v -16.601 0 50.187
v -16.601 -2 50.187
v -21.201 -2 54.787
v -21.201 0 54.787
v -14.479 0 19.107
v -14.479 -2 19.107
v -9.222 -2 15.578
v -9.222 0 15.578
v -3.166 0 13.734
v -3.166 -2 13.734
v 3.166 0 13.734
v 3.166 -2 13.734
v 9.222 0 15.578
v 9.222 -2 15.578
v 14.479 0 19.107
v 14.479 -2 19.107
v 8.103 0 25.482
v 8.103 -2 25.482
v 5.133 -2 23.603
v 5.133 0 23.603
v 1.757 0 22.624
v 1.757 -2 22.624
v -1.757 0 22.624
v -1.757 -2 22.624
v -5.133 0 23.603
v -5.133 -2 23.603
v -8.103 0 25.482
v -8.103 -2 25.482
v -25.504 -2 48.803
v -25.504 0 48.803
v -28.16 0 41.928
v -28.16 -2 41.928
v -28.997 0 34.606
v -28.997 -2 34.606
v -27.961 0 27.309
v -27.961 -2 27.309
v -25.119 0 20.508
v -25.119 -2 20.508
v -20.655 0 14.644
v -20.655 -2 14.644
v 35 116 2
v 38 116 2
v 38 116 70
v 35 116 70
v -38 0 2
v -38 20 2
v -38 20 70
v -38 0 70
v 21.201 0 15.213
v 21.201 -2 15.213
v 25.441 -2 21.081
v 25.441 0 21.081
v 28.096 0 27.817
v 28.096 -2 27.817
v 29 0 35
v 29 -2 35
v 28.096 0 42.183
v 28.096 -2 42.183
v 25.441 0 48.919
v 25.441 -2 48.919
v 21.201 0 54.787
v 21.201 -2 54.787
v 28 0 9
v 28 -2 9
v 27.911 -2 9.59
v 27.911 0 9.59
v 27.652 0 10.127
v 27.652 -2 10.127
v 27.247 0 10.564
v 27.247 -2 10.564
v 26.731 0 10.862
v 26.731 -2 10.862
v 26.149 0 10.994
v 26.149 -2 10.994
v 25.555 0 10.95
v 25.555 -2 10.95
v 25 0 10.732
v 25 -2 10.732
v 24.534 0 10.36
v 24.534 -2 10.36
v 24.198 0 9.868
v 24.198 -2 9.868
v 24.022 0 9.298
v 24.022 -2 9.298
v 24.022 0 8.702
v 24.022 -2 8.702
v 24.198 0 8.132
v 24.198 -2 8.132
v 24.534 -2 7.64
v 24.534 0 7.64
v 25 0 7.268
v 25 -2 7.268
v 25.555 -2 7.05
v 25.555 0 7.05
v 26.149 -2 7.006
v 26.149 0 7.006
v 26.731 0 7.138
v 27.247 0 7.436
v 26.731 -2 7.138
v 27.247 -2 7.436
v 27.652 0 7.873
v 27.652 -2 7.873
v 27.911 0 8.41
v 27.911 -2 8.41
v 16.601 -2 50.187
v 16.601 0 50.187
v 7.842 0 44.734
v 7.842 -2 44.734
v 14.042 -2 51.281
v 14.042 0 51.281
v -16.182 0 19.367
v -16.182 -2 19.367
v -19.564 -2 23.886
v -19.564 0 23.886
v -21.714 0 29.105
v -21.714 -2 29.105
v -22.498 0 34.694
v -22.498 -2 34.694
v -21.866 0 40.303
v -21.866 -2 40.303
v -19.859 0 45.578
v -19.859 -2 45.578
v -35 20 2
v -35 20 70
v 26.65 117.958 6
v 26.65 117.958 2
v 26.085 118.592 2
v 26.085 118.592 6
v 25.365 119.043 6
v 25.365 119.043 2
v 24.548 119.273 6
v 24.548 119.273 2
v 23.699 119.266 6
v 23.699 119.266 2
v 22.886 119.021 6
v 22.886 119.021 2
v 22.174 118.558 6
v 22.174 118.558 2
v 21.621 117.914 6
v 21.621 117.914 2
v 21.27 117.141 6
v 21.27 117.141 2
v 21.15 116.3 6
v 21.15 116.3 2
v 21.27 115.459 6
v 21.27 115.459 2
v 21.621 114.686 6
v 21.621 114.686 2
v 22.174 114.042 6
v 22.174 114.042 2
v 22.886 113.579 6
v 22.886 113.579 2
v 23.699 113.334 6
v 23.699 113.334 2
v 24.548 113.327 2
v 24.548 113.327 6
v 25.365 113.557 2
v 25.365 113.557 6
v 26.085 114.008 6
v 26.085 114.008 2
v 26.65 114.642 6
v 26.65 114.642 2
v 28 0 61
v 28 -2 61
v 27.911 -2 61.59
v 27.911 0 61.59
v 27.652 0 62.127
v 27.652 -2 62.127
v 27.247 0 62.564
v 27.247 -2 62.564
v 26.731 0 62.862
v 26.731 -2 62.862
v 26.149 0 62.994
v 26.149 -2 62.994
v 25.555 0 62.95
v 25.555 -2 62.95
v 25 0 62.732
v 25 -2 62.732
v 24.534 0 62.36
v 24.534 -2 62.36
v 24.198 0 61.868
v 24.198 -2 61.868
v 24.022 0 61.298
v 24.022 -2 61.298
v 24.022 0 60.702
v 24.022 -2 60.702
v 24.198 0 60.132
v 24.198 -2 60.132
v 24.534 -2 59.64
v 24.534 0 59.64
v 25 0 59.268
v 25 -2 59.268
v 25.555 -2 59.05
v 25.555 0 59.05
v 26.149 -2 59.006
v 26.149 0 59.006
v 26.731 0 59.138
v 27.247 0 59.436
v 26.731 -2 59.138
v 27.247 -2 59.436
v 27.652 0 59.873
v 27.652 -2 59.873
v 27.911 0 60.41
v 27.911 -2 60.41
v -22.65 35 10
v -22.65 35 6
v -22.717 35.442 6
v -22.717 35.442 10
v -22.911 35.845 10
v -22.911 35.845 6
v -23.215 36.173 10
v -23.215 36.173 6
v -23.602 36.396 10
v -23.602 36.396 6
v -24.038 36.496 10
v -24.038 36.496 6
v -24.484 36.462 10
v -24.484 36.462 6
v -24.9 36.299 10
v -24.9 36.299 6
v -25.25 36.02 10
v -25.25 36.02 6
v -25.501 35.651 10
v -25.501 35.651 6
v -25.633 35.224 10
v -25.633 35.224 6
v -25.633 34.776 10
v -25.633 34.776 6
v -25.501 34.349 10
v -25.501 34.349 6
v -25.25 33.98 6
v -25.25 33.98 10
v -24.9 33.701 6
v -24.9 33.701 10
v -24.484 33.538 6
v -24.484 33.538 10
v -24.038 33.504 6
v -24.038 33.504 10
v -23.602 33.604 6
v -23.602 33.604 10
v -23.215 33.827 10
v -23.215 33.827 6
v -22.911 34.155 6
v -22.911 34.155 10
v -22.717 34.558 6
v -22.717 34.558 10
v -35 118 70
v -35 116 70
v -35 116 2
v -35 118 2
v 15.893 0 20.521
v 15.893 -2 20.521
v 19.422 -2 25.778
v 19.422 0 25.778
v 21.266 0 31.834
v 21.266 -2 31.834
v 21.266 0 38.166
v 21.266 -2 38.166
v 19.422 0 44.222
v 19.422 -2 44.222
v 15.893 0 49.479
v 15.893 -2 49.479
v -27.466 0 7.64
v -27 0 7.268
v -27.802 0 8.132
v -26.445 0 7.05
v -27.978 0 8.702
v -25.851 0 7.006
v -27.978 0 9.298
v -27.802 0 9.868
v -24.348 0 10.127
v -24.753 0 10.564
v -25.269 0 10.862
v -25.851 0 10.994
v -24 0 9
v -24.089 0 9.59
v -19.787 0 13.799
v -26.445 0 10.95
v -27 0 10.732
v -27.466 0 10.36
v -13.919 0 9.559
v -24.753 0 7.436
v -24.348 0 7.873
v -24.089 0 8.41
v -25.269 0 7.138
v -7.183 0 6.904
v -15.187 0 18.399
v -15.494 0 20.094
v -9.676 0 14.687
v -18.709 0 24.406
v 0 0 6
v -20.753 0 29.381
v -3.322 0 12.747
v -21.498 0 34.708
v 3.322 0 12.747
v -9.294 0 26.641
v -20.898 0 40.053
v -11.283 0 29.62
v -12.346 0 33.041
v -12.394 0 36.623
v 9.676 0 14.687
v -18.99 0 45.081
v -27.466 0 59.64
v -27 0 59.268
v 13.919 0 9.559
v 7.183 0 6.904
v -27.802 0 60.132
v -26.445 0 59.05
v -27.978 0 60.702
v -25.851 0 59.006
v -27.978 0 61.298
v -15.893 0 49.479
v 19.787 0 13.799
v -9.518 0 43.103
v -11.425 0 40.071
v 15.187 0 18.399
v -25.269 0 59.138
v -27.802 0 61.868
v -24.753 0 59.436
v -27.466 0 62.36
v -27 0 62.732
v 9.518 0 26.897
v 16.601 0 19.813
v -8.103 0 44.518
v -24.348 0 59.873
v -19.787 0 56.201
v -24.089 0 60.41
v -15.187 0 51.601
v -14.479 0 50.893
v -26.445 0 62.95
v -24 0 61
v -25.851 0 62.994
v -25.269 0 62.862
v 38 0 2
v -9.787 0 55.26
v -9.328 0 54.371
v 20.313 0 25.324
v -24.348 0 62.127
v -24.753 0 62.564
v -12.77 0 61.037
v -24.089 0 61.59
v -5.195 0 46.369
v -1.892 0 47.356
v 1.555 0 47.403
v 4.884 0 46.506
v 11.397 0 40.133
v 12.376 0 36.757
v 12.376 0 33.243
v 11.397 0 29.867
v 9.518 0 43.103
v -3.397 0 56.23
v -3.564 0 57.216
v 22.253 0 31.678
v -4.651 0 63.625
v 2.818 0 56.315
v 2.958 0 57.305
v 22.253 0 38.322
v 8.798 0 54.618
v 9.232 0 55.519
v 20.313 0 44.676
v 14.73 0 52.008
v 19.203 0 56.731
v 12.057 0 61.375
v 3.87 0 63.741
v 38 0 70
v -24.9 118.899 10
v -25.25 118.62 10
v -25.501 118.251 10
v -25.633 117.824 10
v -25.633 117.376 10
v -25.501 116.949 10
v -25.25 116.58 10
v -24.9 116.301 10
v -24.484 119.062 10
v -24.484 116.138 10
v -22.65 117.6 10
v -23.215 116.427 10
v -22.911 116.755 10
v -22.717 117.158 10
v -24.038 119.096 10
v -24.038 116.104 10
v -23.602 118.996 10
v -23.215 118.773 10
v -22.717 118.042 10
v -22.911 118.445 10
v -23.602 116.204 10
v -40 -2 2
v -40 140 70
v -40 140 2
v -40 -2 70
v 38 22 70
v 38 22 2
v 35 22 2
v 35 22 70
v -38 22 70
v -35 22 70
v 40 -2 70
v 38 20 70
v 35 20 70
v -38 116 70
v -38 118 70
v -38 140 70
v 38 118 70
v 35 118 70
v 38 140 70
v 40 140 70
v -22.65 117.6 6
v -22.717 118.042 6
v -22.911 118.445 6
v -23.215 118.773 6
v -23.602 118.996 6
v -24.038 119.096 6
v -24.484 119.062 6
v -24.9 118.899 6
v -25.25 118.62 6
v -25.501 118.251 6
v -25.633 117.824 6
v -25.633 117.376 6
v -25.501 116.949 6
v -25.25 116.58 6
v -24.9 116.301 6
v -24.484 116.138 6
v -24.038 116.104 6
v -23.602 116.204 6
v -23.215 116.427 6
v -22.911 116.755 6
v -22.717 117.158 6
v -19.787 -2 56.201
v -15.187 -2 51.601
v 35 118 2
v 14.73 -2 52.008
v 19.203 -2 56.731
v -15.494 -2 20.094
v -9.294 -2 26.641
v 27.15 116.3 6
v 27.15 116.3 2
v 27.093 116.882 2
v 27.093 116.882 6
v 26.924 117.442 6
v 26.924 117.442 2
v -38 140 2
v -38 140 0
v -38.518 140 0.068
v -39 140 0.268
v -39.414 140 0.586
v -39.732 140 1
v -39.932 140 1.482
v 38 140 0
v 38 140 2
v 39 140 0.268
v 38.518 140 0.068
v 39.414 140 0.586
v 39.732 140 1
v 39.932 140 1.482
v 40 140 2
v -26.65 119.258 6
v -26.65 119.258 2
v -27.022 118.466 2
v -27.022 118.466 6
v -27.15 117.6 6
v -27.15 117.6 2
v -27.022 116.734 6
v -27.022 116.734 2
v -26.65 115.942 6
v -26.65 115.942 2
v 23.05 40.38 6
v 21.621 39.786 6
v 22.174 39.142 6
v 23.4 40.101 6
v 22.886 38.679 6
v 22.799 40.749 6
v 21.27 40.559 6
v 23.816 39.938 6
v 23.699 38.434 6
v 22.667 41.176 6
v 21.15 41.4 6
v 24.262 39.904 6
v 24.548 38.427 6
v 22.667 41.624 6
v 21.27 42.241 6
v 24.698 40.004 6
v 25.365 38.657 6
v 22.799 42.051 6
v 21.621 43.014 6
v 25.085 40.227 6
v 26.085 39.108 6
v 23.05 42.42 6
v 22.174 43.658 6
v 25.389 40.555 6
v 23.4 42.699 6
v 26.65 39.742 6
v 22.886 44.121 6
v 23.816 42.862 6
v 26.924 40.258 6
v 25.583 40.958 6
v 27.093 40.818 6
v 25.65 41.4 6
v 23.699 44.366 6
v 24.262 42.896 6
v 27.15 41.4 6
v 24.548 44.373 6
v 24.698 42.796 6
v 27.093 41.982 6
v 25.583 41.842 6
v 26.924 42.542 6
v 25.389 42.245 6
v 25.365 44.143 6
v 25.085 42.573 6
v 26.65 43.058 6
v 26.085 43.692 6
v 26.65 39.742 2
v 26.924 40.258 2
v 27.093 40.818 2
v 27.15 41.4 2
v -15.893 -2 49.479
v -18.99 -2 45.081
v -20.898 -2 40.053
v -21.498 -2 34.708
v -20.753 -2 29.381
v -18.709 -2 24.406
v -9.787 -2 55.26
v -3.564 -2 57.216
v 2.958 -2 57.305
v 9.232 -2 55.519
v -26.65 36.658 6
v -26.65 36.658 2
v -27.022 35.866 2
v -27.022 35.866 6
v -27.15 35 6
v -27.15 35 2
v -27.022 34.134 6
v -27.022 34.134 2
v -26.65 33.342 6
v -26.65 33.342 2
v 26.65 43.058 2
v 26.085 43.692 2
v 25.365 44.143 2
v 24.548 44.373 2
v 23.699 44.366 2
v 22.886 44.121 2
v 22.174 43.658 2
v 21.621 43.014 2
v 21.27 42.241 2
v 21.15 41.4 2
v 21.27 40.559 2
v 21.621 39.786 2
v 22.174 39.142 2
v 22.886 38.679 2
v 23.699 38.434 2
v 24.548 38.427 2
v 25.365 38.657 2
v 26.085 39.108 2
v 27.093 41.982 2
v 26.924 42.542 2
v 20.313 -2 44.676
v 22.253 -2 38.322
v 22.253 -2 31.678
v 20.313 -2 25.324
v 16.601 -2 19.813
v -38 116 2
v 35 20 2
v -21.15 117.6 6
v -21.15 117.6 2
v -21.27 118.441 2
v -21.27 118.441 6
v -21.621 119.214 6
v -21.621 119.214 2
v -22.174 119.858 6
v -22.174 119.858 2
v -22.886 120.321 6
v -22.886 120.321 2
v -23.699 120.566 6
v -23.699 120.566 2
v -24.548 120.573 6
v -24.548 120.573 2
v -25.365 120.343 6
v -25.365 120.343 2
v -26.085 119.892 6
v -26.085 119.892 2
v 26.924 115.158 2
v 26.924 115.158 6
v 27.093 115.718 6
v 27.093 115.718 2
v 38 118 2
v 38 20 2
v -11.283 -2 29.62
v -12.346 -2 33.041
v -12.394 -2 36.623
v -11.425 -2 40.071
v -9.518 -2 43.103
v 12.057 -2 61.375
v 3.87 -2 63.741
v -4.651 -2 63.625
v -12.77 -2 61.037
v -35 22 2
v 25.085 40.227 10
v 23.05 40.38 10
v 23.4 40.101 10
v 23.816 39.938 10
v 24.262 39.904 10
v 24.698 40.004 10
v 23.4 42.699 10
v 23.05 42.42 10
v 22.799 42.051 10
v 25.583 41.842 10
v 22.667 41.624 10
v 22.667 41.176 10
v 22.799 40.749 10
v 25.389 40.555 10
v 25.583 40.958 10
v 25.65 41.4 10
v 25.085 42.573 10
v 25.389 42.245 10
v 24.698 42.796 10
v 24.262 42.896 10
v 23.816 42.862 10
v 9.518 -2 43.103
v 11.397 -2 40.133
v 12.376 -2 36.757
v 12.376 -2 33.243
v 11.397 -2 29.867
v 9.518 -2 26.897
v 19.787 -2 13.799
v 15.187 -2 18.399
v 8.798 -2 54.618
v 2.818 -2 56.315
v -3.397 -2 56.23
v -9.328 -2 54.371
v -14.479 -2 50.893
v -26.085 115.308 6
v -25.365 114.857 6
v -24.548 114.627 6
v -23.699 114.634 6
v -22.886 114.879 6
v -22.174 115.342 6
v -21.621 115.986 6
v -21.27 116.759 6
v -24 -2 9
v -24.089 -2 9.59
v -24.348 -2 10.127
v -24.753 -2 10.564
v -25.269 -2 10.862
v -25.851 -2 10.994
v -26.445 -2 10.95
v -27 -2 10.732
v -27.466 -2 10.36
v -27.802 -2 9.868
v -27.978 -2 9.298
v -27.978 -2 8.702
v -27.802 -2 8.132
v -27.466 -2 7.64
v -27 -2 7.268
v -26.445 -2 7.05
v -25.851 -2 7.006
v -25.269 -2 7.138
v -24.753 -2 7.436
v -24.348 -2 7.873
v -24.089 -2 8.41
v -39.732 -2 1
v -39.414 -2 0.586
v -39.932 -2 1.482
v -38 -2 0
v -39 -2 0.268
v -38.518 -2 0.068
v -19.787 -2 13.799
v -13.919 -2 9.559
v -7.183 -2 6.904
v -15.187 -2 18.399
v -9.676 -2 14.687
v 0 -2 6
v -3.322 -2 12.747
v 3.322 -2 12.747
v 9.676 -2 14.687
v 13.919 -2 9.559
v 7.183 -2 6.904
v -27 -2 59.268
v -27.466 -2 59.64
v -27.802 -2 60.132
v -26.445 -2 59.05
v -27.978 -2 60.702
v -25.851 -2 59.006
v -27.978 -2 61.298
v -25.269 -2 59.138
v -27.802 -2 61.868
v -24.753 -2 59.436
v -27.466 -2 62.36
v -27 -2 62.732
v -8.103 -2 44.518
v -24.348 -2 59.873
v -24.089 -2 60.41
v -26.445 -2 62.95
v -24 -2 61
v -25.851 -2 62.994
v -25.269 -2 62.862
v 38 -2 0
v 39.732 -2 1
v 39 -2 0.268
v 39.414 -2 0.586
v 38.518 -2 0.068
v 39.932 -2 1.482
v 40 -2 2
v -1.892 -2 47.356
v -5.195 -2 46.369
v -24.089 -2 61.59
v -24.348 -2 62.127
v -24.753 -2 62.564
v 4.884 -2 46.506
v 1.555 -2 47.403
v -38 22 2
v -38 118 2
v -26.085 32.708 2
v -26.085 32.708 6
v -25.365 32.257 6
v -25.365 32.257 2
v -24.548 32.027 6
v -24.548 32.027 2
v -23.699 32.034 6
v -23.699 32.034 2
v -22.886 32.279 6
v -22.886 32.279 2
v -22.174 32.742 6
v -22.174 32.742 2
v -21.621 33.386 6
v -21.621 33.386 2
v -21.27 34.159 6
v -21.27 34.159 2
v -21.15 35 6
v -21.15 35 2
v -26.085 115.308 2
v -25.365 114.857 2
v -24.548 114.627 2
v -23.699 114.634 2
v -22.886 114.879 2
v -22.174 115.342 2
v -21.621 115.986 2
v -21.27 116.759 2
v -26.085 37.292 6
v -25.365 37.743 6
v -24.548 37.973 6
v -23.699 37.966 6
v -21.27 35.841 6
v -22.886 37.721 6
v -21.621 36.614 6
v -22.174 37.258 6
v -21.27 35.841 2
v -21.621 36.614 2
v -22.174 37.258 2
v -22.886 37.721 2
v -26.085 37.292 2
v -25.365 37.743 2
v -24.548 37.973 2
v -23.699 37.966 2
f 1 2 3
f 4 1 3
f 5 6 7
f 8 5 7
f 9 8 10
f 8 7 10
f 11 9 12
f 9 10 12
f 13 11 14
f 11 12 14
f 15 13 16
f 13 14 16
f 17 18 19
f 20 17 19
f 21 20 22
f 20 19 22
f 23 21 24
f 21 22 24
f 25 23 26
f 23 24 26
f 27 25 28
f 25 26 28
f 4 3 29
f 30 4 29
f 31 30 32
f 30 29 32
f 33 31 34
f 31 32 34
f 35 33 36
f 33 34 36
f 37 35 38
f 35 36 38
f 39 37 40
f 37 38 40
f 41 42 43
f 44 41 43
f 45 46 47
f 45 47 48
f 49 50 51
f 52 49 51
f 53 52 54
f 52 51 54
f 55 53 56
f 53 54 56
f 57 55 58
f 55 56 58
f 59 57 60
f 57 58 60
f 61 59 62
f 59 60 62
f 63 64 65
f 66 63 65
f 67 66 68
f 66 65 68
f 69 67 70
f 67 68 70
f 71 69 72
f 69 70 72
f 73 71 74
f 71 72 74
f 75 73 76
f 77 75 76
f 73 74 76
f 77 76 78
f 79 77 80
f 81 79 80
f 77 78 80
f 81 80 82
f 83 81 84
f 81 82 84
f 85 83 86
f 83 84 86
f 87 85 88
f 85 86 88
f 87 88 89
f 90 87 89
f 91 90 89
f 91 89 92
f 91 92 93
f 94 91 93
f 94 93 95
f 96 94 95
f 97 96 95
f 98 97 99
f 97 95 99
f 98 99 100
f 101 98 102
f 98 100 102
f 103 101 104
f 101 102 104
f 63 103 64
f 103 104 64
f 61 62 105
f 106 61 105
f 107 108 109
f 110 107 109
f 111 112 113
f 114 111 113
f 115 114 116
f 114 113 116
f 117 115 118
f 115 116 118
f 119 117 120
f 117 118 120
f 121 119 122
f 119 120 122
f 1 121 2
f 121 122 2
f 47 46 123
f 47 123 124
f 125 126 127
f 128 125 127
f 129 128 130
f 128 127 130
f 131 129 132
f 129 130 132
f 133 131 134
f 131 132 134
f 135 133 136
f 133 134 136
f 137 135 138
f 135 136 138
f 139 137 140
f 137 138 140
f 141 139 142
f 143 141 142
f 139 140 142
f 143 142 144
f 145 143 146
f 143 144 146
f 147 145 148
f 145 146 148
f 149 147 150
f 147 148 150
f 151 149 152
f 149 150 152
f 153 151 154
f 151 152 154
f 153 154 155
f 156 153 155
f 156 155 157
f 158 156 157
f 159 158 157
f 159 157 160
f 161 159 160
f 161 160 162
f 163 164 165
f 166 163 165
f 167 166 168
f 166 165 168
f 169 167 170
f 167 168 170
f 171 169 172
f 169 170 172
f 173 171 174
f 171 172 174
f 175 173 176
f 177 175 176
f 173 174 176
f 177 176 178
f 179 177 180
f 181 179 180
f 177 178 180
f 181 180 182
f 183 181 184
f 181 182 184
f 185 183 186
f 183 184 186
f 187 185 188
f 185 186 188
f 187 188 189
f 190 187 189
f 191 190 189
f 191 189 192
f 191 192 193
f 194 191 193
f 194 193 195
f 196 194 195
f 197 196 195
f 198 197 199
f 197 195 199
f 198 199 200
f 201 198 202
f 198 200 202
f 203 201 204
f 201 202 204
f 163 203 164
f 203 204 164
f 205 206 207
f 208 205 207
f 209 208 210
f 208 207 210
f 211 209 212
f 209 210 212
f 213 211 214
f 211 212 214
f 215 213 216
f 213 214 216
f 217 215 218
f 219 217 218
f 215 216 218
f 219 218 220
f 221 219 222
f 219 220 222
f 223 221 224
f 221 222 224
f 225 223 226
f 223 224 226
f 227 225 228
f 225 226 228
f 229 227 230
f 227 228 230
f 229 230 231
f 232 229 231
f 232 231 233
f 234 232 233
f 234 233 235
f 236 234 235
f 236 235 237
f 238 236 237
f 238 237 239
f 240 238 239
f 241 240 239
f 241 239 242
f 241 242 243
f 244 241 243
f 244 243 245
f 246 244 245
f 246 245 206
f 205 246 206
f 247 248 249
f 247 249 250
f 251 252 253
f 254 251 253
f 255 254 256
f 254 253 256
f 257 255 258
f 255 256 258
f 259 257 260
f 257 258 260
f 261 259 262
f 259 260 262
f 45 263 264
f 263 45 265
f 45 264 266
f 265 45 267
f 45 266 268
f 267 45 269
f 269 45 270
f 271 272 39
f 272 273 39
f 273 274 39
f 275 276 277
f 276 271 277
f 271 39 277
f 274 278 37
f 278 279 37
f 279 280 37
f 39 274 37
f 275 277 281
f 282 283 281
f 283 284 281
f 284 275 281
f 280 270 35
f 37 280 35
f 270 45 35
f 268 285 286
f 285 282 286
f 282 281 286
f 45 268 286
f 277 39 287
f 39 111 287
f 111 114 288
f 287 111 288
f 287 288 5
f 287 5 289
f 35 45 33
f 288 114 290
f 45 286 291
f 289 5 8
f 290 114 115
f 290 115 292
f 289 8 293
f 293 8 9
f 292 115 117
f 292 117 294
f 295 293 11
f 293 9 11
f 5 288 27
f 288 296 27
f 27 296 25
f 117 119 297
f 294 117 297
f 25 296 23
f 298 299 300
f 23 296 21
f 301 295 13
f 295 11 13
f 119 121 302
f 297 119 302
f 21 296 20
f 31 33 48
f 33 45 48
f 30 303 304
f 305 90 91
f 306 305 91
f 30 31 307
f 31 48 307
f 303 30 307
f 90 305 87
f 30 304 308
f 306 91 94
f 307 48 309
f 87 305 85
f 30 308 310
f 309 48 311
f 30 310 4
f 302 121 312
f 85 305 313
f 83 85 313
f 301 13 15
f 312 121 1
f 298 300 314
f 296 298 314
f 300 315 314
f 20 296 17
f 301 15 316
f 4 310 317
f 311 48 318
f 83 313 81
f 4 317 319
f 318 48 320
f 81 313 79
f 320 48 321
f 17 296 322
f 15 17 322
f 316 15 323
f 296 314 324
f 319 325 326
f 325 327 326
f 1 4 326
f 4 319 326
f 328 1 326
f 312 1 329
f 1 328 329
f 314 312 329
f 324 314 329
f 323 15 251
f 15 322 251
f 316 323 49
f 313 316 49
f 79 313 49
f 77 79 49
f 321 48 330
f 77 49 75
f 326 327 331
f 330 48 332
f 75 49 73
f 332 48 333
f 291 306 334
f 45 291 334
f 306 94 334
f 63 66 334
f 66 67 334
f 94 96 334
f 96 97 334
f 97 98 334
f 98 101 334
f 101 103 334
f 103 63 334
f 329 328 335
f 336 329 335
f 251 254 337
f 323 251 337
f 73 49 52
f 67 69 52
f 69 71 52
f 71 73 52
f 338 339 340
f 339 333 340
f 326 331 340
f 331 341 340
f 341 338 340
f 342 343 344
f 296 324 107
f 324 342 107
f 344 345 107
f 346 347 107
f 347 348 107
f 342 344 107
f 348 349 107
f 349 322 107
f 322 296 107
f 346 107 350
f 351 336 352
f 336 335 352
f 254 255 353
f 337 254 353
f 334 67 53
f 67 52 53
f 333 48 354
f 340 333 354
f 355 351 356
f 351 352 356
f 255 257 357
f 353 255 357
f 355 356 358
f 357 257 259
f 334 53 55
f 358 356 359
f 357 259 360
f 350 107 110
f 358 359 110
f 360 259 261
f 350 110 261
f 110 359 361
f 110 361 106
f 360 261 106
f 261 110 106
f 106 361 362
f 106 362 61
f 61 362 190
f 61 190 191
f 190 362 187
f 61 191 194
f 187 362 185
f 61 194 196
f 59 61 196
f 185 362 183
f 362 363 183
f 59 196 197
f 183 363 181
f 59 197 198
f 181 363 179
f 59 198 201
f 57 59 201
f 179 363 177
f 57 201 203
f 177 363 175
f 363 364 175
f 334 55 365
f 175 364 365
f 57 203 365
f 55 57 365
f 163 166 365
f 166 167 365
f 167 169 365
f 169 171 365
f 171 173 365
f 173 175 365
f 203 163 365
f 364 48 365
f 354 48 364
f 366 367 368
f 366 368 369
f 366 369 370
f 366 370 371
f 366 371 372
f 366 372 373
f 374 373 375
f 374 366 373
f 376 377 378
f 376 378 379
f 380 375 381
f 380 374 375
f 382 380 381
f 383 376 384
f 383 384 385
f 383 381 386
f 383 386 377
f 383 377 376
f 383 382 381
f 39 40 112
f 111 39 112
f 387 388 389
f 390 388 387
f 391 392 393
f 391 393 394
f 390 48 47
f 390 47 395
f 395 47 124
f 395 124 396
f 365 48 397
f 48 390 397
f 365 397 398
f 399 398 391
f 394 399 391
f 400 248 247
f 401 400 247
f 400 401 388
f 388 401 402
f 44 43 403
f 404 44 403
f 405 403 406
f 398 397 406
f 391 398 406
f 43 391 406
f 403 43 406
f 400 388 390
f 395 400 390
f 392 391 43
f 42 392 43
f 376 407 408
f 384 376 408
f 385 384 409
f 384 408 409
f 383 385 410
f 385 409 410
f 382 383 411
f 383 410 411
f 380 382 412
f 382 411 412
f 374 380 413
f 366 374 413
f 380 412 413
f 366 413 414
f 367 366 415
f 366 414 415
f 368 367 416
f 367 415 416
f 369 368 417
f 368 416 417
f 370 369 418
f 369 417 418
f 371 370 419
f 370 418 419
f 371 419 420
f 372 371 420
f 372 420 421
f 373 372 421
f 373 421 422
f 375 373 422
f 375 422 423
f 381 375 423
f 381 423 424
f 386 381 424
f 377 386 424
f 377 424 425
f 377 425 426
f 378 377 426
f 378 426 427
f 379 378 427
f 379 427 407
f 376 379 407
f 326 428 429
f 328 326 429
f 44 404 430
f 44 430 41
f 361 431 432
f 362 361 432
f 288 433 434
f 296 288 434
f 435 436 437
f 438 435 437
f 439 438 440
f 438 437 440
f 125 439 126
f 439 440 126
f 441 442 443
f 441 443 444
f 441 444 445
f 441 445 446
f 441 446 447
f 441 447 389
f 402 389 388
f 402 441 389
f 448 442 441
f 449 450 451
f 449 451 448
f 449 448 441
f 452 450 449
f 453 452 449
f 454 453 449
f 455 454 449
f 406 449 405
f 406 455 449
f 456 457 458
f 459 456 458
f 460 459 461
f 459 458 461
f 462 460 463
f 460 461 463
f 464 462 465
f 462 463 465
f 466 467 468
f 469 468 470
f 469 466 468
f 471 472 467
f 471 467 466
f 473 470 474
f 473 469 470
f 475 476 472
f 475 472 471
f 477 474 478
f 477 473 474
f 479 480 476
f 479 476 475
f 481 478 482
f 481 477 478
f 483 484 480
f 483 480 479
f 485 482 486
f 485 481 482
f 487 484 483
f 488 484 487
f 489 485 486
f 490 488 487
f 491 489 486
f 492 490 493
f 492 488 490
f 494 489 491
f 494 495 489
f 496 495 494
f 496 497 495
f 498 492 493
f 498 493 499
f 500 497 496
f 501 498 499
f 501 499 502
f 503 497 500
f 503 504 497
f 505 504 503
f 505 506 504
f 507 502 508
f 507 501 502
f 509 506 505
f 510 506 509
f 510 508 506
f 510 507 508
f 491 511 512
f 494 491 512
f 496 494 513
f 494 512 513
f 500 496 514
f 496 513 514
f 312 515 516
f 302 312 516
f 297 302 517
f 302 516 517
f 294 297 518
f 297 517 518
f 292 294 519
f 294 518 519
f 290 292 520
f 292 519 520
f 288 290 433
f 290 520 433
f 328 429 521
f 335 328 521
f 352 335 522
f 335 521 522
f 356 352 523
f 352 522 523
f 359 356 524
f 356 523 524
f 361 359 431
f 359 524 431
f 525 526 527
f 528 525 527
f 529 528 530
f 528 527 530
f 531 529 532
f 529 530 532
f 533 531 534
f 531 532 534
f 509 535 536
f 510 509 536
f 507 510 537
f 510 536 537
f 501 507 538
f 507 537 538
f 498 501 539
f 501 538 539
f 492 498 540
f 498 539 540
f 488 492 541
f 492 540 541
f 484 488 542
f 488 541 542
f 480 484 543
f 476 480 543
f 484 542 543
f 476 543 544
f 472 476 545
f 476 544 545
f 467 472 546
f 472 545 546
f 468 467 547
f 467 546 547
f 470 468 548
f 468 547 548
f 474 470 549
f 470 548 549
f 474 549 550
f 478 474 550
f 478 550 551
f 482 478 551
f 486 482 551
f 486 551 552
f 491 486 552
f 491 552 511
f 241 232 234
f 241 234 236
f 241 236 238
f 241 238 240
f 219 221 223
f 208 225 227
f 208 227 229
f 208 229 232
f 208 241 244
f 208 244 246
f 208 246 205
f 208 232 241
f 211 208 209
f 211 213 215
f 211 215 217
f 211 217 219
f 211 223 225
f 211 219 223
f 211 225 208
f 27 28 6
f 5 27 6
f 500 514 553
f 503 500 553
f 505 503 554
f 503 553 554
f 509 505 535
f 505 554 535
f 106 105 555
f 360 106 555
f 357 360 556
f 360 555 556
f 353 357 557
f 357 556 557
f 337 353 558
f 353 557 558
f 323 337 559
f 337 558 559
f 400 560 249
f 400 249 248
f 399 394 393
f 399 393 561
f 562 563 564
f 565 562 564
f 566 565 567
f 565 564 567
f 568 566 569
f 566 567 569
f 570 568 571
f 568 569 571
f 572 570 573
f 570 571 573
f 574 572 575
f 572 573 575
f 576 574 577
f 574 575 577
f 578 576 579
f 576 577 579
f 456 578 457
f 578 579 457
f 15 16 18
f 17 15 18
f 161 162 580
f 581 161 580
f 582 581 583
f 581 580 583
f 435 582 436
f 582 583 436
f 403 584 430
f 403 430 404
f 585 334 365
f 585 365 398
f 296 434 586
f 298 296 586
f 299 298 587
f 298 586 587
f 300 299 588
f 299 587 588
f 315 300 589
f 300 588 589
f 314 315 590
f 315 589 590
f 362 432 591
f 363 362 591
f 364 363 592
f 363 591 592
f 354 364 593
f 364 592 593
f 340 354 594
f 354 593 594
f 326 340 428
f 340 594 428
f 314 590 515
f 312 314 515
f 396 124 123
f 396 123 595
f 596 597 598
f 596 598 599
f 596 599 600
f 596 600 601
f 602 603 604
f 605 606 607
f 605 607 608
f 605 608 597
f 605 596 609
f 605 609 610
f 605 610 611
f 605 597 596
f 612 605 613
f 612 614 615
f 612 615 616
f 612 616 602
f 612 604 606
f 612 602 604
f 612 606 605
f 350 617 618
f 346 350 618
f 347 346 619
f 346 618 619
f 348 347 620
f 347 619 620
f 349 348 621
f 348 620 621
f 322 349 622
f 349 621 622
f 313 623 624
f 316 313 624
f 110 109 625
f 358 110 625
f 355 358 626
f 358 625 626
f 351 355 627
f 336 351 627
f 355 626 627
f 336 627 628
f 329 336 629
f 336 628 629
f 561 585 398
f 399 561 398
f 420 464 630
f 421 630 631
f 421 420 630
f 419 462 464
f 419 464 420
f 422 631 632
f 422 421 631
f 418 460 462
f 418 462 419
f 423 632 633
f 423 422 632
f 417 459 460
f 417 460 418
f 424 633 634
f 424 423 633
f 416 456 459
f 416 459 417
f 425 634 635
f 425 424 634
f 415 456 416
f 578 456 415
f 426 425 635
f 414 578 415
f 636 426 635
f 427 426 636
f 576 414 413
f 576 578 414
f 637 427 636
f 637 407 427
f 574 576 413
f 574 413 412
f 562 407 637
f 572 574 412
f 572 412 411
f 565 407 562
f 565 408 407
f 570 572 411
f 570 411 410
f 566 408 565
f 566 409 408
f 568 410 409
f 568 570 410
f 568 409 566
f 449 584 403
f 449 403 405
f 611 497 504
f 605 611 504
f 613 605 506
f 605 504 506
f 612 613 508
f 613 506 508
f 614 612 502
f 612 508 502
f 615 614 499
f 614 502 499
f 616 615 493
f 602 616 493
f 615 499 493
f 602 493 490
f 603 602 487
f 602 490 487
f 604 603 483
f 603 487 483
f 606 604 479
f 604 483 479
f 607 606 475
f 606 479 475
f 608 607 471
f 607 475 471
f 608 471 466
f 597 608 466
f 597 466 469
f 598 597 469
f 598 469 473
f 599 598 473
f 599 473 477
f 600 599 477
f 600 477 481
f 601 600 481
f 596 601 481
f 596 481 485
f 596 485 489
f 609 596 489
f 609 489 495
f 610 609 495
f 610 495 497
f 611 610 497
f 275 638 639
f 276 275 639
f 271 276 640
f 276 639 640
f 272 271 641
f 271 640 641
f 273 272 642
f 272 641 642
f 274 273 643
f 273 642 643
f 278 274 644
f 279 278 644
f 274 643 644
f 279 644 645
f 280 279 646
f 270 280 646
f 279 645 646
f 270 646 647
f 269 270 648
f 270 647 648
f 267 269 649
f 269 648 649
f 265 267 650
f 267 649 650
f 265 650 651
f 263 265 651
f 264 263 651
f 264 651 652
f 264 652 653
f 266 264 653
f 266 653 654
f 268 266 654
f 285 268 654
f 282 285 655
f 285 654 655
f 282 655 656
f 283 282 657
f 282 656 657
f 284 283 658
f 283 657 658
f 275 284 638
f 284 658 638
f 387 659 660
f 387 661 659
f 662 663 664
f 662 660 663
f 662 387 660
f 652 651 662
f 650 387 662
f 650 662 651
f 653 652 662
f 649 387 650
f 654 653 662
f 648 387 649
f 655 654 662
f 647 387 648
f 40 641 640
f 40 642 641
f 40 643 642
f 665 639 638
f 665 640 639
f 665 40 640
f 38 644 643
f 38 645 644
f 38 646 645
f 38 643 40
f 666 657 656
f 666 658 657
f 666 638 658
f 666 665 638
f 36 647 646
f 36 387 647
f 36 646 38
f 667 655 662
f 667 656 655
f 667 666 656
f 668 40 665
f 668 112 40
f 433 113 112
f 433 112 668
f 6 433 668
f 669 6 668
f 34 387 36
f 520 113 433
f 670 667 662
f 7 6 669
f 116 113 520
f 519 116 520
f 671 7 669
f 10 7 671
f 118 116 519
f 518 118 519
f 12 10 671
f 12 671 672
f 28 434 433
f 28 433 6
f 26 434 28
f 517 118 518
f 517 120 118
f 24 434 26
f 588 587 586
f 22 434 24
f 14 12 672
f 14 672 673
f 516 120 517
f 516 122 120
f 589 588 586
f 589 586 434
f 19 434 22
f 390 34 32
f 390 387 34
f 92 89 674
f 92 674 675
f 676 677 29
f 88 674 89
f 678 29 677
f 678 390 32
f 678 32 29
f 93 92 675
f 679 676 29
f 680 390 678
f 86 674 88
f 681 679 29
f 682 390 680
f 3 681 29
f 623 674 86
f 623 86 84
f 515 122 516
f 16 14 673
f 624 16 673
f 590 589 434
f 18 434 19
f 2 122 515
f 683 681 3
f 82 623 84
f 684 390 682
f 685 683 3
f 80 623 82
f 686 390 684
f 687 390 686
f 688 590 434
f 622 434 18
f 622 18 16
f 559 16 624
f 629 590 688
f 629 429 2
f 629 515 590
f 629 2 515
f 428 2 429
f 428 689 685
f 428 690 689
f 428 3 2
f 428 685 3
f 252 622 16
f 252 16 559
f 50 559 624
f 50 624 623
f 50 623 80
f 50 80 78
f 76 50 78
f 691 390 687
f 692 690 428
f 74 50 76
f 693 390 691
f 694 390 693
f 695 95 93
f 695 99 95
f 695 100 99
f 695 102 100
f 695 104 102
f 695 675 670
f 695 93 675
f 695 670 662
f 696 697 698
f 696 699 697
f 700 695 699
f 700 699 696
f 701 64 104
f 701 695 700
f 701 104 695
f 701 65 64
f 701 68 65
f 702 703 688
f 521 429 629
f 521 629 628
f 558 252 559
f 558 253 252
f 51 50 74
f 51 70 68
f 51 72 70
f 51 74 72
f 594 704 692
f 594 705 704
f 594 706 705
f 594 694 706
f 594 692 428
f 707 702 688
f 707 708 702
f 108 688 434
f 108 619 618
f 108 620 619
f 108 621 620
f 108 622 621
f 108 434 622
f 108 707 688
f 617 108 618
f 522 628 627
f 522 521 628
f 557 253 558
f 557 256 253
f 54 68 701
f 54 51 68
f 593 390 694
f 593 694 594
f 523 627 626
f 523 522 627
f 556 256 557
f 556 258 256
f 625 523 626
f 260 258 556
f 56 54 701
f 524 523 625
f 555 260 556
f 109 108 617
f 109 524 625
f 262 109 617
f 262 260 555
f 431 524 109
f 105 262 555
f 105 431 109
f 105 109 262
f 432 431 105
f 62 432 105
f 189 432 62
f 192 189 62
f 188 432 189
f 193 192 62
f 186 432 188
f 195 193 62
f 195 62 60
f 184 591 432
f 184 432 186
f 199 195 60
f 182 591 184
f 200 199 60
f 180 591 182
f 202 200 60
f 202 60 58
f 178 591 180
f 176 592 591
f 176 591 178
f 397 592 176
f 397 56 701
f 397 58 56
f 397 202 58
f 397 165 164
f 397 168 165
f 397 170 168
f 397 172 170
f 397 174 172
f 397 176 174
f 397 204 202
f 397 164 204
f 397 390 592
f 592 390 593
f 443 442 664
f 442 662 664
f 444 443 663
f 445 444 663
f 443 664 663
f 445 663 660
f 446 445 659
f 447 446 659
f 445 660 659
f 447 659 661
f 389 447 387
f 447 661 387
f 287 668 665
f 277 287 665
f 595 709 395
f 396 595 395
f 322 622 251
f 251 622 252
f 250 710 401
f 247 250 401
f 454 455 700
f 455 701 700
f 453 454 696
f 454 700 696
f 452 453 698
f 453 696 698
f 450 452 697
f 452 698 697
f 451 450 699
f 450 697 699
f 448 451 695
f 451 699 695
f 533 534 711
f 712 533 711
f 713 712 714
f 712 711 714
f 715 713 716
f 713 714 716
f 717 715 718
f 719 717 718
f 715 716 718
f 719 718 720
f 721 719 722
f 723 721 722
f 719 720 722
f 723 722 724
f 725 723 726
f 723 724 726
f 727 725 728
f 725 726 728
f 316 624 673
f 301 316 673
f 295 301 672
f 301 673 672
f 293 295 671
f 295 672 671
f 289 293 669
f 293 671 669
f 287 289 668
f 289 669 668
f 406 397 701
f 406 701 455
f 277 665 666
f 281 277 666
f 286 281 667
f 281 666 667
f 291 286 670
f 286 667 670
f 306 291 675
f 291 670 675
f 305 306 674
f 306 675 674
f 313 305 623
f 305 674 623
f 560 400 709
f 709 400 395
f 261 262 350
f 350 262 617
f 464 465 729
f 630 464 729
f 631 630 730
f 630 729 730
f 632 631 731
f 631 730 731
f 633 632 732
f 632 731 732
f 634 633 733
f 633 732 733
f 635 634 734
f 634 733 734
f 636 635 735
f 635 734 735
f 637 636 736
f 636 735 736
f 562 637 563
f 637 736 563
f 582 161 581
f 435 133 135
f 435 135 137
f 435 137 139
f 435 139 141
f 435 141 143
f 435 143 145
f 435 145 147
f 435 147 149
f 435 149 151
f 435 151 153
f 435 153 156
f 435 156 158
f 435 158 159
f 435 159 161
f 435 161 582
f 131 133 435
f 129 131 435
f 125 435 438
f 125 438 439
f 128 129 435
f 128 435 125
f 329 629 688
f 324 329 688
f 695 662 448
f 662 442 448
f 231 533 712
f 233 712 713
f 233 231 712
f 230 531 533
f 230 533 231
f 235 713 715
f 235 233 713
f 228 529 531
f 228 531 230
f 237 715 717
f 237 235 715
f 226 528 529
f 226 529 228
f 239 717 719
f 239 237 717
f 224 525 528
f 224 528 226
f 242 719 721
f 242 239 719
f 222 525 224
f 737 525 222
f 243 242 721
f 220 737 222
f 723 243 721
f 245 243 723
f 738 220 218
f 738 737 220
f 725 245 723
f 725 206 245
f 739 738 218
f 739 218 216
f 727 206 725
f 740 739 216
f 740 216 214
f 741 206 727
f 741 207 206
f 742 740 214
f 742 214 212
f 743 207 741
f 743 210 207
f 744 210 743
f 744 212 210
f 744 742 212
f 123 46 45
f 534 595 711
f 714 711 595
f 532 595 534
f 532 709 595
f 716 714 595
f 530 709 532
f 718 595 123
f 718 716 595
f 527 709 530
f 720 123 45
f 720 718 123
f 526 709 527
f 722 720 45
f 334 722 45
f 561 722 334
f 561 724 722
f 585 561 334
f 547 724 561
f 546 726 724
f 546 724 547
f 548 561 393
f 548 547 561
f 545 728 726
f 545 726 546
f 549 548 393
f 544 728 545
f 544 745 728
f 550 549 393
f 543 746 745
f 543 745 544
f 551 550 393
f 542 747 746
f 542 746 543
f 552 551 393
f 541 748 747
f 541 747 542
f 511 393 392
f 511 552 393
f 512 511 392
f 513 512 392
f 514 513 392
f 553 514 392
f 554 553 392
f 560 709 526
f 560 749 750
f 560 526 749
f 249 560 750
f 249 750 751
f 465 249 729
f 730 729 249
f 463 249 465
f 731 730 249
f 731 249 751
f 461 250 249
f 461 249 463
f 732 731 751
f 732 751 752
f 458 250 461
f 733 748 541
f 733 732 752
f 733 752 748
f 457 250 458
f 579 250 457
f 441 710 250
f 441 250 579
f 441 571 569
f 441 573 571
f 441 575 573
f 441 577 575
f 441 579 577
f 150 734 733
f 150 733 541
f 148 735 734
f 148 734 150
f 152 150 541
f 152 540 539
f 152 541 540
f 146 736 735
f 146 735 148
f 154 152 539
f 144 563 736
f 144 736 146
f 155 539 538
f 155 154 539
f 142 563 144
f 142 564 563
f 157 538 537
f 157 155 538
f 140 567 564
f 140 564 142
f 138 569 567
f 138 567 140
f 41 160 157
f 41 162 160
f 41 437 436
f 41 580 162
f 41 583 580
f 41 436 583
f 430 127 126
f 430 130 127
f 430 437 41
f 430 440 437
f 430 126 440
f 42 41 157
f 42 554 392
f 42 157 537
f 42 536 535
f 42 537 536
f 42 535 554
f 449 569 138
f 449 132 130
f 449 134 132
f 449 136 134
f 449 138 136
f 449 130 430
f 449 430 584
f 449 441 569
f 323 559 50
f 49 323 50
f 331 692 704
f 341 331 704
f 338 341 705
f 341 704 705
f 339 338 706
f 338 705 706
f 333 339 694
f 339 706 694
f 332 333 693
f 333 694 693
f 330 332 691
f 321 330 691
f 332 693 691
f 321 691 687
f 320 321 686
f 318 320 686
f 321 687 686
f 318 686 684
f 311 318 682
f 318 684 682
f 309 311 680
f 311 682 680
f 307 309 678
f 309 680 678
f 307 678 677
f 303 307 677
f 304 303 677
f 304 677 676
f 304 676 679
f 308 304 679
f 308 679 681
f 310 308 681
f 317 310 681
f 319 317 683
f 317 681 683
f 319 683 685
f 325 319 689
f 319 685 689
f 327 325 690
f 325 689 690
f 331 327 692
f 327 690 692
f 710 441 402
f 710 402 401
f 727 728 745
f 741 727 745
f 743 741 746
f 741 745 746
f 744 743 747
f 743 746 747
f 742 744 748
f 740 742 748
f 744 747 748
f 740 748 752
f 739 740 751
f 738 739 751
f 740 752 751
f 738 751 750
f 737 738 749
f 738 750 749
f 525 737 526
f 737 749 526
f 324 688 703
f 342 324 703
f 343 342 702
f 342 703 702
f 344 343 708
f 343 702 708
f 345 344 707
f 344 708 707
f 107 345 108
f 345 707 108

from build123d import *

# Parameters (mm, degrees)
F0_W      = 80
F0_H      = 70
F1_DEPTH  = 2
F2_W      = 80
F2_H      = 140
F3_DEPTH  = 2
F4_W      = 140
F4_H      = 68
F5_DEPTH  = 2
F6_W      = 140
F6_H      = 68
F7_DEPTH  = 2
F8_R      = 2
F9_DEPTH  = 2
F10_R     = 2
F11_R     = 1.5
F12_DEPTH = 4
F13_DEPTH = 8
F14_DEPTH = 8
F15_W     = 2
F15_H     = 68
F16_DEPTH = 3
F17_W     = 2
F17_H     = 68
F18_DEPTH = 3


with BuildPart() as f1:
    # F0 (on Front) → F1 (new body)
    with BuildSketch(Plane.XZ):
        with Locations((0, 35)):
            Rectangle(F0_W, F0_H)
    extrude(amount=F1_DEPTH)

    # F2 (on Top) → F3 (join)
    with BuildSketch(Plane.XY):
        with Locations((0, 70)):
            Rectangle(F2_W, F2_H)
    extrude(amount=F3_DEPTH)

    # F4 (on face) → F5 (join)
    with BuildSketch(Plane(origin=(-40, 0, 0), x_dir=(0, -1, 0), z_dir=(-1, 0, 0))):
        with Locations((-70, 36)):
            Rectangle(F4_W, F4_H)
    extrude(amount=-F5_DEPTH)

    # F6 (on face) → F7 (join)
    with BuildSketch(Plane.YZ.offset(40)):
        with Locations((70, 36)):
            Rectangle(F6_W, F6_H)
    extrude(amount=-F7_DEPTH)

    # F8 (on face) → F9 (cut)
    with BuildSketch(Plane.XZ.offset(2)):
        with BuildLine():
            Line((-9.5176118745, 43.1033983122), (-15.8934493297, 49.4792357673))
            ThreePointArc((-15.8934493297, 49.4792357673), (-21.4980117445, 34.7076115032), (-15.4937871876, 20.0938751318))
            Line((-15.4937871876, 20.0938751318), (-9.2937080159, 26.640754142))
            ThreePointArc((-9.2937080159, 26.640754142), (-12.4988440375, 34.8300066879), (-9.5176118745, 43.1033983122))
        make_face()
        with BuildLine():
            Line((-16.6012881064, 50.1870745441), (-21.2010083131, 54.7867947507))
            ThreePointArc((-21.2010083131, 54.7867947507), (-28.997318167, 34.6056155159), (-20.6550363783, 14.6439327912))
            Line((-20.6550363783, 14.6439327912), (-16.1821134643, 19.3670475013))
            ThreePointArc((-16.1821134643, 19.3670475013), (-22.4979192675, 34.6940120382), (-16.6012881064, 50.1870745441))
        make_face()
        with Locations((-26, 61)):
            Circle(F8_R)
        with BuildLine():
            ThreePointArc((19.2028843822, 56.731296128), (-0.3943844841, 63.997318167), (-19.7867947507, 56.2010083131))
            Line((-19.7867947507, 56.2010083131), (-15.1870745441, 51.6012881064))
            ThreePointArc((-15.1870745441, 51.6012881064), (-0.3059879618, 57.4979192675), (14.7299614682, 52.0081814179))
            Line((14.7299614682, 52.0081814179), (19.2028843822, 56.731296128))
        make_face()
        with BuildLine():
            ThreePointArc((14.0416351915, 51.2813537874), (-0.2923884968, 56.4980117445), (-14.4792357673, 50.8934493297))
            Line((-14.4792357673, 50.8934493297), (-8.1033983122, 44.5176118745))
            ThreePointArc((-8.1033983122, 44.5176118745), (-0.1699933121, 47.4988440375), (7.8415560198, 44.7344747772))
            Line((7.8415560198, 44.7344747772), (14.0416351915, 51.2813537874))
        make_face()
        with BuildLine():
            Line((9.5176118745, 26.8966016878), (15.8934493297, 20.5207642327))
            ThreePointArc((15.8934493297, 20.5207642327), (21.5, 35), (15.8934493297, 49.4792357673))
            Line((15.8934493297, 49.4792357673), (9.5176118745, 43.1033983122))
            ThreePointArc((9.5176118745, 43.1033983122), (12.5, 35), (9.5176118745, 26.8966016878))
        make_face()
        with BuildLine():
            Line((21.2010083131, 54.7867947507), (16.6012881064, 50.1870745441))
            ThreePointArc((16.6012881064, 50.1870745441), (22.5, 35), (16.6012881064, 19.8129254559))
            Line((16.6012881064, 19.8129254559), (21.2010083131, 15.2132052493))
            ThreePointArc((21.2010083131, 15.2132052493), (29, 35), (21.2010083131, 54.7867947507))
        make_face()
        with Locations((26, 61)):
            Circle(F8_R)
        with Locations((26, 9)):
            Circle(F8_R)
        with BuildLine():
            Line((-15.1870745441, 18.3987118936), (-19.7867947507, 13.7989916869))
            ThreePointArc((-19.7867947507, 13.7989916869), (0, 6), (19.7867947507, 13.7989916869))
            Line((19.7867947507, 13.7989916869), (15.1870745441, 18.3987118936))
            ThreePointArc((15.1870745441, 18.3987118936), (0, 12.5), (-15.1870745441, 18.3987118936))
        make_face()
        with BuildLine():
            ThreePointArc((8.1033983122, 25.4823881255), (0, 22.5), (-8.1033983122, 25.4823881255))
            Line((-8.1033983122, 25.4823881255), (-14.4792357673, 19.1065506703))
            ThreePointArc((-14.4792357673, 19.1065506703), (0, 13.5), (14.4792357673, 19.1065506703))
            Line((14.4792357673, 19.1065506703), (8.1033983122, 25.4823881255))
        make_face()
        with Locations((-26, 9)):
            Circle(F8_R)
    extrude(amount=-F9_DEPTH, mode=Mode.SUBTRACT)

    # F10
    f10_edges = [f1.edges().sort_by_distance(p)[0] for p in [
        (40, 69, 0),
        (-40, 69, 0),
    ]]
    fillet(f10_edges, radius=F10_R)

    # F11 (on face) → F12 (join)
    with BuildSketch(Plane.XY.offset(2)):
        with BuildLine():
            ThreePointArc((-21.15, 117.6), (-23.2839745962, 120.4722813233), (-26.65, 119.2583123952))
            Line((-26.65, 119.2583123952), (-26.65, 115.9416876048))
            ThreePointArc((-26.65, 115.9416876048), (-23.2839745962, 114.7277186767), (-21.15, 117.6))
        make_face()
        with Locations((-24.15, 117.6)):
            Circle(F11_R, mode=Mode.SUBTRACT)
        with BuildLine():
            Line((26.65, 114.6416876048), (26.65, 117.9583123952))
            ThreePointArc((26.65, 117.9583123952), (21.15, 116.3), (26.65, 114.6416876048))
        make_face()
        with Locations((24.15, 116.3)):
            Circle(F11_R, mode=Mode.SUBTRACT)
        with BuildLine():
            ThreePointArc((-21.15, 35), (-23.2839745962, 37.8722813233), (-26.65, 36.6583123952))
            Line((-26.65, 36.6583123952), (-26.65, 33.3416876048))
            ThreePointArc((-26.65, 33.3416876048), (-23.2839745962, 32.1277186767), (-21.15, 35))
        make_face()
        with Locations((-24.15, 35)):
            Circle(F11_R, mode=Mode.SUBTRACT)
        with BuildLine():
            Line((26.65, 39.7416876048), (26.65, 43.0583123952))
            ThreePointArc((26.65, 43.0583123952), (21.15, 41.4), (26.65, 39.7416876048))
        make_face()
        with Locations((24.15, 41.4)):
            Circle(F11_R, mode=Mode.SUBTRACT)
        with Locations((24.15, 116.3)):
            Circle(F11_R)
        with BuildLine():
            ThreePointArc((27.15, 116.3), (27.0222813233, 117.1660254038), (26.65, 117.9583123952))
            Line((26.65, 117.9583123952), (26.65, 114.6416876048))
            ThreePointArc((26.65, 114.6416876048), (27.0222813233, 115.4339745962), (27.15, 116.3))
        make_face()
        with BuildLine():
            Line((-26.65, 115.9416876048), (-26.65, 119.2583123952))
            ThreePointArc((-26.65, 119.2583123952), (-27.15, 117.6), (-26.65, 115.9416876048))
        make_face()
        with BuildLine():
            ThreePointArc((27.15, 41.4), (27.0222813233, 42.2660254038), (26.65, 43.0583123952))
            Line((26.65, 43.0583123952), (26.65, 39.7416876048))
            ThreePointArc((26.65, 39.7416876048), (27.0222813233, 40.5339745962), (27.15, 41.4))
        make_face()
        with BuildLine():
            Line((-26.65, 33.3416876048), (-26.65, 36.6583123952))
            ThreePointArc((-26.65, 36.6583123952), (-27.15, 35), (-26.65, 33.3416876048))
        make_face()
    extrude(amount=F12_DEPTH)

    # F11 (on face) → F13 (join)
    with BuildSketch(Plane.XY.offset(2)):
        with Locations((-24.15, 35)):
            Circle(F11_R)
        with Locations((-24.15, 117.6)):
            Circle(F11_R)
    extrude(amount=F13_DEPTH)

    # F11 (on face) → F14 (join)
    with BuildSketch(Plane.XY.offset(2)):
        with Locations((24.15, 41.4)):
            Circle(F11_R)
    extrude(amount=F14_DEPTH)

    # F15 (on face) → F16 (join)
    with BuildSketch(Plane(origin=(38, 0, 0), x_dir=(0, -1, 0), z_dir=(-1, 0, 0))):
        with Locations((-117, 36)):
            Rectangle(F15_W, F15_H)
        with Locations((-21, 36)):
            Rectangle(F15_W, F15_H)
    extrude(amount=F16_DEPTH)

    # F17 (on face) → F18 (join)
    with BuildSketch(Plane.YZ.offset(-38)):
        with Locations((21, 36)):
            Rectangle(F17_W, F17_H)
        with Locations((117, 36)):
            Rectangle(F17_W, F17_H)
    extrude(amount=F18_DEPTH)


solid = f1.part
